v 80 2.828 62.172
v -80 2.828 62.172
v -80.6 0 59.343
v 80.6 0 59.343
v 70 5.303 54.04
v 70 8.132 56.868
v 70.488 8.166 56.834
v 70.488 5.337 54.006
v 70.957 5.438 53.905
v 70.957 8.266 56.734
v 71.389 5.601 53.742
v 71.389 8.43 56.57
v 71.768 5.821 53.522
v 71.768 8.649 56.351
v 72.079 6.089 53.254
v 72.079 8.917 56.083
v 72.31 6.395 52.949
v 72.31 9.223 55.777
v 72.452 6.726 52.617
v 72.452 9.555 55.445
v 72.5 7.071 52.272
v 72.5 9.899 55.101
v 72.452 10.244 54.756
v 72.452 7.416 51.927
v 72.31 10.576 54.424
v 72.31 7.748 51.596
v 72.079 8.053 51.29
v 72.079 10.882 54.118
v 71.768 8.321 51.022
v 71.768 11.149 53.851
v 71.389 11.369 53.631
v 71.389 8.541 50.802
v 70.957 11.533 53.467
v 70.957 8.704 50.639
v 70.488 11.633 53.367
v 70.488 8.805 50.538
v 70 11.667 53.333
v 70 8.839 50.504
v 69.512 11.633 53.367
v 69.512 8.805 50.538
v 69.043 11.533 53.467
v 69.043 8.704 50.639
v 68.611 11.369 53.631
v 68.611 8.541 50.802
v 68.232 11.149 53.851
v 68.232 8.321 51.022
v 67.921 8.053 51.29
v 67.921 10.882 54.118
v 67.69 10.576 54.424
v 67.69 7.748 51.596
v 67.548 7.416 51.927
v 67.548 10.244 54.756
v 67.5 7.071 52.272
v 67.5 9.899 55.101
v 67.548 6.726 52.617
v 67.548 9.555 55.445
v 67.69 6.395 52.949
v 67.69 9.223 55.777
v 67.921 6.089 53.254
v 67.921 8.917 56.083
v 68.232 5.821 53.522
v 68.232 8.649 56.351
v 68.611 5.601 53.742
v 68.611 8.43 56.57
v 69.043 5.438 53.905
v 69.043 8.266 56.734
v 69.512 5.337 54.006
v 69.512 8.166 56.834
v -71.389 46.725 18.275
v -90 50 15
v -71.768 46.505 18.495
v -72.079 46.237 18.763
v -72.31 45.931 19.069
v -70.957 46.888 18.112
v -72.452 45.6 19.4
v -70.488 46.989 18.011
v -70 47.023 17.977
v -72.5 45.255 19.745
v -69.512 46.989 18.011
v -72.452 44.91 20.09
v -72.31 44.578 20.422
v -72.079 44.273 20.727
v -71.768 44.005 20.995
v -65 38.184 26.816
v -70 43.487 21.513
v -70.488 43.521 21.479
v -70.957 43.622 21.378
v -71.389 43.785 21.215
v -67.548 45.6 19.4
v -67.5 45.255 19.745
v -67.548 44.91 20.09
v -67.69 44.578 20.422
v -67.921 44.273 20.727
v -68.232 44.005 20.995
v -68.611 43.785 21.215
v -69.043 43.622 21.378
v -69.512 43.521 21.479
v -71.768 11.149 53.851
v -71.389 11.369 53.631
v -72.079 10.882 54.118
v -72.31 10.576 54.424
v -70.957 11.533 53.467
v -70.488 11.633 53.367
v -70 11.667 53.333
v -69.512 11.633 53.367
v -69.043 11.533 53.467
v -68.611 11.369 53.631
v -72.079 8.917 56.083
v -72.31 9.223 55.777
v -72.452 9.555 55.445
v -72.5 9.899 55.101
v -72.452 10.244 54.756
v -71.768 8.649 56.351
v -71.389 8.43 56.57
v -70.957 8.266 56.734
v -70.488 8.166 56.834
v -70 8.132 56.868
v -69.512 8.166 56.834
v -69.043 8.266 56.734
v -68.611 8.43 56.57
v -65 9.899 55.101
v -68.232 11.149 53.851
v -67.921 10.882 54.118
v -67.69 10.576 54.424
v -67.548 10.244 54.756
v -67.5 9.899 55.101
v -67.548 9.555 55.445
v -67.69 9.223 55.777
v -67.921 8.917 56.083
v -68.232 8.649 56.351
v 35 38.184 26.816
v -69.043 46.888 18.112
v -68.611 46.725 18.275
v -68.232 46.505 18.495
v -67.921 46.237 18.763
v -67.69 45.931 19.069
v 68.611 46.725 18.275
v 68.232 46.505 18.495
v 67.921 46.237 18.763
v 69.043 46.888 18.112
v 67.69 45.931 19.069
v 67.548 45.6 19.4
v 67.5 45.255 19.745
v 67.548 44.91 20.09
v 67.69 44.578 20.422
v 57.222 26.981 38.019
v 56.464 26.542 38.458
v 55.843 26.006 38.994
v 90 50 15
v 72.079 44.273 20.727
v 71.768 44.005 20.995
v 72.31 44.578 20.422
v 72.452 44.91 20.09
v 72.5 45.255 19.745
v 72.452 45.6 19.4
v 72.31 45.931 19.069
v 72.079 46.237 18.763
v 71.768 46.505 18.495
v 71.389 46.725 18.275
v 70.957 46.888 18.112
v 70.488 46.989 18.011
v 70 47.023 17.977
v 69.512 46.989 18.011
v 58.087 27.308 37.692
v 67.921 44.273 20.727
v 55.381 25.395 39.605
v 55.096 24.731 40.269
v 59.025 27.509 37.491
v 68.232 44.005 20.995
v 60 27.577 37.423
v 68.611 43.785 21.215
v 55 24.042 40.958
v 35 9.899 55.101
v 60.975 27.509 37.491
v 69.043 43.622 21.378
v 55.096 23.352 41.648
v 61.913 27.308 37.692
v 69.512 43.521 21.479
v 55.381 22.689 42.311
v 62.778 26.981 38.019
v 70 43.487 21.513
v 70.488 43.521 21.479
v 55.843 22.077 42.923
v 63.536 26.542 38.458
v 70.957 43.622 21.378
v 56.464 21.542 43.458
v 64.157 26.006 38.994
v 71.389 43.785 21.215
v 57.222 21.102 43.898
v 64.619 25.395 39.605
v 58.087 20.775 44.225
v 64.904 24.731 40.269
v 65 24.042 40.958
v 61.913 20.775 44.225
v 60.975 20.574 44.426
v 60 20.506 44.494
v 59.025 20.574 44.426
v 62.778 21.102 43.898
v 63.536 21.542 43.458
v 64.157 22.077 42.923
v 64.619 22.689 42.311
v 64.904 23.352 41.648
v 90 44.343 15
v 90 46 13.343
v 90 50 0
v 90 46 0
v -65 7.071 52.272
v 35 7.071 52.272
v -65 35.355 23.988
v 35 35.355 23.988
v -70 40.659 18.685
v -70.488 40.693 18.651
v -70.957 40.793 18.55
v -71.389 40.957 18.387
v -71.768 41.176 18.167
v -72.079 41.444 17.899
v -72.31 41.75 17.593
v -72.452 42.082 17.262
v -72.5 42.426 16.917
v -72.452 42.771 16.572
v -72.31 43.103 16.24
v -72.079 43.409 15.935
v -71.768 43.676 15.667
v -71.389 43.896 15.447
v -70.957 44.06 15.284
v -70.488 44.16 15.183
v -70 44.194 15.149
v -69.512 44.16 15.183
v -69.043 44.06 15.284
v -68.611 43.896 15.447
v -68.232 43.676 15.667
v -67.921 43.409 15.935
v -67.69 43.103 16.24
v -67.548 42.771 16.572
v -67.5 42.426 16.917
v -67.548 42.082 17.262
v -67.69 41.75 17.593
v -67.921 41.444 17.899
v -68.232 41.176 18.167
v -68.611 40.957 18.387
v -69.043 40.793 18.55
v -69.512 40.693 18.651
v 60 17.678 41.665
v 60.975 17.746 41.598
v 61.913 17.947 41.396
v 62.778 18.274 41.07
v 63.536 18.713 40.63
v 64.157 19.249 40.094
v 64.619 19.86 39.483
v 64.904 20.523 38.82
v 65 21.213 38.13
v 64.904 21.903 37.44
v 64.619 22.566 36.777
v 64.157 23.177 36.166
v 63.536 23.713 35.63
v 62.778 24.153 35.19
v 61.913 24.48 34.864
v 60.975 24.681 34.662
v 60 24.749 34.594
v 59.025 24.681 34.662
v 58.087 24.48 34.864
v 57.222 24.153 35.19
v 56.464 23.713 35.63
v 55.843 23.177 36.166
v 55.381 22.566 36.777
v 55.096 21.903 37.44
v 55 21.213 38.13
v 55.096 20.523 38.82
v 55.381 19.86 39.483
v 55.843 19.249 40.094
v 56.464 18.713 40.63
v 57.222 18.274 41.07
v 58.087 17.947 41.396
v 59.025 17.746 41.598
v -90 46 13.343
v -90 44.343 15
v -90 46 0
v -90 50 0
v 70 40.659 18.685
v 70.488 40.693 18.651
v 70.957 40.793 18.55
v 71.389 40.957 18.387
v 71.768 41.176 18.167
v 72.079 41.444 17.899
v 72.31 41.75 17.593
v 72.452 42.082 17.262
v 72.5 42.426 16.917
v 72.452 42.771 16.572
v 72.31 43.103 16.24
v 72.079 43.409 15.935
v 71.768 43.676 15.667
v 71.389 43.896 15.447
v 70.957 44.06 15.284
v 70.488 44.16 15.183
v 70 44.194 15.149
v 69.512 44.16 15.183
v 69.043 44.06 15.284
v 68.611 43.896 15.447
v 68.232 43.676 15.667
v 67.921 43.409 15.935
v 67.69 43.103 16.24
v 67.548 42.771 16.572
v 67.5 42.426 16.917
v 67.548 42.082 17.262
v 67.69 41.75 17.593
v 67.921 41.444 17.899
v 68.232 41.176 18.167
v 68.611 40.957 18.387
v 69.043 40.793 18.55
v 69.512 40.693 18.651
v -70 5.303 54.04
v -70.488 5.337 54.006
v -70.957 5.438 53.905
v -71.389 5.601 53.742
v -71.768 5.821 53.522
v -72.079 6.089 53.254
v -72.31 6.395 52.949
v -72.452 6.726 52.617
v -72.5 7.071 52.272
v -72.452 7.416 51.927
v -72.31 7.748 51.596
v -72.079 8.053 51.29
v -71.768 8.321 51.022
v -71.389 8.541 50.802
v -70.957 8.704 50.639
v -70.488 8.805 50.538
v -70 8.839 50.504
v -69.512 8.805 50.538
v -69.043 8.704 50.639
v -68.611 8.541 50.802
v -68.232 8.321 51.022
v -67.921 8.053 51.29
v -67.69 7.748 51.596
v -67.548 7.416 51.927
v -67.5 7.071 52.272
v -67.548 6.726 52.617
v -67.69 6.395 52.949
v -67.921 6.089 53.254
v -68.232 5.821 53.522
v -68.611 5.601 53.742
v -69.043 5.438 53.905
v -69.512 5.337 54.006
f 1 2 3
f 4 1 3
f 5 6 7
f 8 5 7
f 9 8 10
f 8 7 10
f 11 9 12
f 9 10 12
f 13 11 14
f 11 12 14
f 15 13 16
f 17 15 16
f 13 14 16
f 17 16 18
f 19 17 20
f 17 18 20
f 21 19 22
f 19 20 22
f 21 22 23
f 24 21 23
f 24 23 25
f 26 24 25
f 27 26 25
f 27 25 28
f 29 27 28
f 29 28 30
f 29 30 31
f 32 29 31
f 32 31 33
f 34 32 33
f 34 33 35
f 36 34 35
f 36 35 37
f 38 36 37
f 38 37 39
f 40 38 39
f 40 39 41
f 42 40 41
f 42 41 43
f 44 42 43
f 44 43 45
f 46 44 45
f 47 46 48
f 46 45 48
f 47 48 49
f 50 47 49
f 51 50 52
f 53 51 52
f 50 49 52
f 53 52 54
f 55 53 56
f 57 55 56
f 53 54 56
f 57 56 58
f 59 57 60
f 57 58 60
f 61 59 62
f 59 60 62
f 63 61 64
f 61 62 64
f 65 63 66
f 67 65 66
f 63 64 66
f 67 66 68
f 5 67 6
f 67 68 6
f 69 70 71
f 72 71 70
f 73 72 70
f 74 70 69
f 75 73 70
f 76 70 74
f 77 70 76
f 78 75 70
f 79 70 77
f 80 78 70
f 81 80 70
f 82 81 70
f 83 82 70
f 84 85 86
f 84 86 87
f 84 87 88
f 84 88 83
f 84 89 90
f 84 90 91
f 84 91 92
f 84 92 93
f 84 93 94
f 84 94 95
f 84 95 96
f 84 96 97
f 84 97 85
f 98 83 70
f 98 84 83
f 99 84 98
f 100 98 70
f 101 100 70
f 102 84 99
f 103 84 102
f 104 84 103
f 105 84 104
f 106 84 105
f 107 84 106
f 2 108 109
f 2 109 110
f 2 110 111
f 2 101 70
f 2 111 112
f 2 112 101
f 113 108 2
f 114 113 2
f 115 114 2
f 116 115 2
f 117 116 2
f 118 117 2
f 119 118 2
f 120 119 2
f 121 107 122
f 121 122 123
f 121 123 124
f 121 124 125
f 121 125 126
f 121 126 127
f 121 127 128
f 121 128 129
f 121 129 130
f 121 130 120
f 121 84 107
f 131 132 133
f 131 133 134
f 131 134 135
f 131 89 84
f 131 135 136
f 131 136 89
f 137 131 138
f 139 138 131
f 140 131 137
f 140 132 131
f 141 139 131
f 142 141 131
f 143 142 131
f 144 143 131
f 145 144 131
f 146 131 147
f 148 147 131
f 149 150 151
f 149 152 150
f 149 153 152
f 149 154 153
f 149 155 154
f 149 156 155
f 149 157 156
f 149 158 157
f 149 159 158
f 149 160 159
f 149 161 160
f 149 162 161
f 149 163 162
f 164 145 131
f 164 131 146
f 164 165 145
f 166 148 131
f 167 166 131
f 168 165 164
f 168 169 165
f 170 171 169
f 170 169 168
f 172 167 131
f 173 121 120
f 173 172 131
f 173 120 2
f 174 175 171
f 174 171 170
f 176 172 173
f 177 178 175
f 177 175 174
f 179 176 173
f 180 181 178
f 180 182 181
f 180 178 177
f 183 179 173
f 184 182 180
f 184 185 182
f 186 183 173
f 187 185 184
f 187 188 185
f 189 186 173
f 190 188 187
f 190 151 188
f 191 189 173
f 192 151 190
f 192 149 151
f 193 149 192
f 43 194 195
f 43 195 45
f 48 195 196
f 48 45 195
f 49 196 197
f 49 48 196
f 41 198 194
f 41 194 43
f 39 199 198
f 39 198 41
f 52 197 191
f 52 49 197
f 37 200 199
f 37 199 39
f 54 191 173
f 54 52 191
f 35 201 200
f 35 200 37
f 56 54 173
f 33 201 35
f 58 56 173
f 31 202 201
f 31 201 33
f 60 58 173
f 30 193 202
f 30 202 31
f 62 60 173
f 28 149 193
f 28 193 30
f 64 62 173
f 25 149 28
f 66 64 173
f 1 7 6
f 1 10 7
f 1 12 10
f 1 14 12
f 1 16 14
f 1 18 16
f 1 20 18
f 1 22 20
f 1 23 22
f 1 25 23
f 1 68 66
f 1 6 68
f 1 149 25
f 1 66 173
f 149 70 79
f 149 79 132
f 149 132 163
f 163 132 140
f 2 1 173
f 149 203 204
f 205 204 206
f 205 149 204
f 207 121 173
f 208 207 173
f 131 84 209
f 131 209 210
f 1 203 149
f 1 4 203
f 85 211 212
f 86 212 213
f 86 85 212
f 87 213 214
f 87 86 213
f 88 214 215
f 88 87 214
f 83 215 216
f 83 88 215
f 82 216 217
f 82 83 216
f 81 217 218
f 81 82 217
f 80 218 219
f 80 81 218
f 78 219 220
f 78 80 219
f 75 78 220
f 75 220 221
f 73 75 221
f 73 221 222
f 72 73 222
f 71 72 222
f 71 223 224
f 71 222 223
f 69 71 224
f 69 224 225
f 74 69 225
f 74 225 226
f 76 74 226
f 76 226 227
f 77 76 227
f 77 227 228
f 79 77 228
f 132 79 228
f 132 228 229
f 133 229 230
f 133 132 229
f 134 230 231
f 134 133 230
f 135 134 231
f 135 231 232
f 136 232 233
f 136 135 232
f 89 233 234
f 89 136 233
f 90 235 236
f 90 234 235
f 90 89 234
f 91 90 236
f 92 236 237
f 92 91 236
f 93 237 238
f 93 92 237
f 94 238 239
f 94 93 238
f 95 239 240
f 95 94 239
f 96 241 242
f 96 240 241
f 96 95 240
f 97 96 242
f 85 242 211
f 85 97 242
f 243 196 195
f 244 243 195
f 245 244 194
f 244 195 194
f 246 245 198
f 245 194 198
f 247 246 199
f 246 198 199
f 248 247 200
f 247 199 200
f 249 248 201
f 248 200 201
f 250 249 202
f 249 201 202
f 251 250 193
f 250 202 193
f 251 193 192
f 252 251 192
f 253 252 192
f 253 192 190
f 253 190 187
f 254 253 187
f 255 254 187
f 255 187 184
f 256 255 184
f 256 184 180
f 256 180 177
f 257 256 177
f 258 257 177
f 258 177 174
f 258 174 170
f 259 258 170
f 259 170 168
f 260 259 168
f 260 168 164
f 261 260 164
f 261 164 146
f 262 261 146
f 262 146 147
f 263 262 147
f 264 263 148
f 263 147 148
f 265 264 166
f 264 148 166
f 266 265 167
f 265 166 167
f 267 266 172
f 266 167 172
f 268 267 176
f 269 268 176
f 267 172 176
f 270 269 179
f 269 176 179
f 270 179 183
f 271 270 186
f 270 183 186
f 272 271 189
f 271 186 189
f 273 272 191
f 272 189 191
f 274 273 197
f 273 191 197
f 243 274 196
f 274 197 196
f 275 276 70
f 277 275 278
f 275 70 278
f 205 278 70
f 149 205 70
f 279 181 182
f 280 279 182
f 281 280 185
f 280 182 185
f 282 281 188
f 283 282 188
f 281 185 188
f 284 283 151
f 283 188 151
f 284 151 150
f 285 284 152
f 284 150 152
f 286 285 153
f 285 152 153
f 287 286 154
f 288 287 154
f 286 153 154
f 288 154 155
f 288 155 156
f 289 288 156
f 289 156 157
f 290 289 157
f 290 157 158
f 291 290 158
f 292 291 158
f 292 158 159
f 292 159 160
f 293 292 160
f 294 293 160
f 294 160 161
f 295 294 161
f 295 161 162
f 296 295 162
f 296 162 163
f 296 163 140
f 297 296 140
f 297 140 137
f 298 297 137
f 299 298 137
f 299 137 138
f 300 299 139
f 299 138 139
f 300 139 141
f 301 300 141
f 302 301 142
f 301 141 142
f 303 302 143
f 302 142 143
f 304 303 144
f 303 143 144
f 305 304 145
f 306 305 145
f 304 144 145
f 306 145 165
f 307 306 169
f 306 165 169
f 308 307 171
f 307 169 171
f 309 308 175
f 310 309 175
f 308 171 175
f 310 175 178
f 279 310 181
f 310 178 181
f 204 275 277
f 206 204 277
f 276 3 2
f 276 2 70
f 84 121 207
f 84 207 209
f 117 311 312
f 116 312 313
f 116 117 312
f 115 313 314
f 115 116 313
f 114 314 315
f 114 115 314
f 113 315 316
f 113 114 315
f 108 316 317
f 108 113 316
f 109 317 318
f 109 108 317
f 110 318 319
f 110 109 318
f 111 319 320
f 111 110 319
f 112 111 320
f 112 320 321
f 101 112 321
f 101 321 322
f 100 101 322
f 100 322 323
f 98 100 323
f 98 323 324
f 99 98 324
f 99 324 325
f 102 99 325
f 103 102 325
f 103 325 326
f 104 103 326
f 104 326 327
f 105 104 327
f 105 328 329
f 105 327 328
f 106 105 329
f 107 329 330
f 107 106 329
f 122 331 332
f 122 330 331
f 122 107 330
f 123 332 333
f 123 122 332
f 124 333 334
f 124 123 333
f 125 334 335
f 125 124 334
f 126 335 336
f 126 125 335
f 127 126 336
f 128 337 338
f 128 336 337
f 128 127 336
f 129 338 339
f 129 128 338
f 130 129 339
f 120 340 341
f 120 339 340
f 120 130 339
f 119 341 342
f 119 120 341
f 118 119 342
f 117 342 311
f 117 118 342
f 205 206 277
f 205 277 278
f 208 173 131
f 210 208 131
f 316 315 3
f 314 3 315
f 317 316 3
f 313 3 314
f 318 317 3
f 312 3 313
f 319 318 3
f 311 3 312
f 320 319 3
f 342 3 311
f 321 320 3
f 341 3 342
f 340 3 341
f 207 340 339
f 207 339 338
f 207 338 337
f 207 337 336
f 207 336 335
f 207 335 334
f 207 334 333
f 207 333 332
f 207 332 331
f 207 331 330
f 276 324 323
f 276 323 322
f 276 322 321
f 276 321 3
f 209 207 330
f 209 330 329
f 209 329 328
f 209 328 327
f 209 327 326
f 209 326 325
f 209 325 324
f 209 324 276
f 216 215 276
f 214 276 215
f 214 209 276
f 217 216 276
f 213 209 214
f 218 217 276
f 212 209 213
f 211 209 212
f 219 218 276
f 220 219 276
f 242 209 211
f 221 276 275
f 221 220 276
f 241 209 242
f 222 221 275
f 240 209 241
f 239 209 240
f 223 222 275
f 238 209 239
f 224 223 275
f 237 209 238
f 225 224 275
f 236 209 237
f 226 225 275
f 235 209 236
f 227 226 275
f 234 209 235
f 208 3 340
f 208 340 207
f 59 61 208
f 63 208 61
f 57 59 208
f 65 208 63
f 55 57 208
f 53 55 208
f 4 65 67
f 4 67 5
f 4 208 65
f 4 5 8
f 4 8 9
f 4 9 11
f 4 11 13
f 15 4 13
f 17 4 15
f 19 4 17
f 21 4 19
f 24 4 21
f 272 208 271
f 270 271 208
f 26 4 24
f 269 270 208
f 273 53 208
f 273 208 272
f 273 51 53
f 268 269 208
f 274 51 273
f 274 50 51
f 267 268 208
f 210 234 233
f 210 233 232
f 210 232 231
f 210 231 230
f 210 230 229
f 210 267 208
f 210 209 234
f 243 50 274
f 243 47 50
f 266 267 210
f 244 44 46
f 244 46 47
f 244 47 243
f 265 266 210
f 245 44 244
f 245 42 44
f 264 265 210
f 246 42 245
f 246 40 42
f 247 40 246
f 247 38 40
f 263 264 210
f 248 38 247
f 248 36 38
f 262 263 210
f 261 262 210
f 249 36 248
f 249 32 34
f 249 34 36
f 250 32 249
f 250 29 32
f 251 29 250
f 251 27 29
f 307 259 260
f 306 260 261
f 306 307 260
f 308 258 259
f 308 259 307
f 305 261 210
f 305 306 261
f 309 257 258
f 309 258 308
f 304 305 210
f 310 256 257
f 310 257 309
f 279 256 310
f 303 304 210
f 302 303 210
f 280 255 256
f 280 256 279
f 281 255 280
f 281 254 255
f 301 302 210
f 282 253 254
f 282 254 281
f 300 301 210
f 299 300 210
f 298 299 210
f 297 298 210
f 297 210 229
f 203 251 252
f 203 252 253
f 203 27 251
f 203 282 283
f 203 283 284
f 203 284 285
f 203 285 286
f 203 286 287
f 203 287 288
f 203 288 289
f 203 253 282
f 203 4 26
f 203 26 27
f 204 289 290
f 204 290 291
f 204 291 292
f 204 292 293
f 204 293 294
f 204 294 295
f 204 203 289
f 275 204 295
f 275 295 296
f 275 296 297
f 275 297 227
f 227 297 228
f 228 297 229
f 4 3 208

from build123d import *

# Parameters (mm, degrees)
EXTRUDE_1_DEPTH     = 90
CUT_EXTRUDE_1_DEPTH = 160
SKETCH_4_W          = 100
SKETCH_4_H          = 40
CUT_EXTRUDE_2_DEPTH = 102.056914657
SKETCH_5_R          = 5
CUT_EXTRUDE_3_DEPTH = 102.056914657
SKETCH_6_R          = 2.5
CUT_EXTRUDE_4_DEPTH = 102.056914657


with BuildPart() as part:
    # 草圖1 → 填料-伸長1 (new, symmetric)
    with BuildSketch(Plane(origin=(0, 0, 0), x_dir=(0, 0, -1), z_dir=(1, 0, 0))):
        Polygon((-59.343145751, 0), (-13.343145751, 46), (0, 46), (0, 50), (-15, 50), (-62.171572875, 2.828427125), align=None)
    extrude(amount=EXTRUDE_1_DEPTH, both=True)

    # 草圖3 → 除料-伸長1 (cut)
    with BuildSketch(Plane(origin=(0, 0, 0), x_dir=(1, 0, 0), z_dir=(0, 1, 0))):
        Polygon((-90, -15), (-90, -62.171572875), (-80, -62.171572875), align=None)
        Polygon((90, -15), (80, -62.171572875), (90, -62.171572875), align=None)
    extrude(amount=CUT_EXTRUDE_1_DEPTH, mode=Mode.SUBTRACT)

    # 草圖4 → 除料-伸長2 (cut, through all)
    with BuildSketch(Plane(origin=(0, 32.5, 32.5), x_dir=(1, 0, 0), z_dir=(0, 0.7071067811865467, 0.7071067811865485))):
        with Locations((-15, -11.961940777)):
            Rectangle(SKETCH_4_W, SKETCH_4_H)
    extrude(amount=-CUT_EXTRUDE_2_DEPTH, mode=Mode.SUBTRACT)

    # 草圖5 → 除料-伸長3 (cut, through all)
    with BuildSketch(Plane(origin=(0, 32.5, 32.5), x_dir=(1, 0, 0), z_dir=(0, 0.7071067811865467, 0.7071067811865485))):
        with Locations(Location((60, -11.961940777, 0), (0, 0, 270))):
            Circle(SKETCH_5_R)
    extrude(amount=-CUT_EXTRUDE_3_DEPTH, mode=Mode.SUBTRACT)

    # 草圖6 → 除料-伸長4 (cut, through all)
    with BuildSketch(Plane(origin=(0, 32.5, 32.5), x_dir=(1, 0, 0), z_dir=(0, 0.7071067811865467, 0.7071067811865485))):
        with Locations(Location((70, -31.961940777, 0), (0, 0, 270))):
            Circle(SKETCH_6_R)
        with Locations(Location((70, 18.038059223, 0), (0, 0, 270))):
            Circle(SKETCH_6_R)
    cut_extrude_4 = extrude(amount=-CUT_EXTRUDE_4_DEPTH, mode=Mode.SUBTRACT)

    # 鏡射1: 除料-伸長4 across plane
    add(cut_extrude_4.mirror(Plane(origin=(0, 0, 0), x_dir=(0, 0, 1), z_dir=(1, 0, 0))), mode=Mode.SUBTRACT)


solid = part.part
